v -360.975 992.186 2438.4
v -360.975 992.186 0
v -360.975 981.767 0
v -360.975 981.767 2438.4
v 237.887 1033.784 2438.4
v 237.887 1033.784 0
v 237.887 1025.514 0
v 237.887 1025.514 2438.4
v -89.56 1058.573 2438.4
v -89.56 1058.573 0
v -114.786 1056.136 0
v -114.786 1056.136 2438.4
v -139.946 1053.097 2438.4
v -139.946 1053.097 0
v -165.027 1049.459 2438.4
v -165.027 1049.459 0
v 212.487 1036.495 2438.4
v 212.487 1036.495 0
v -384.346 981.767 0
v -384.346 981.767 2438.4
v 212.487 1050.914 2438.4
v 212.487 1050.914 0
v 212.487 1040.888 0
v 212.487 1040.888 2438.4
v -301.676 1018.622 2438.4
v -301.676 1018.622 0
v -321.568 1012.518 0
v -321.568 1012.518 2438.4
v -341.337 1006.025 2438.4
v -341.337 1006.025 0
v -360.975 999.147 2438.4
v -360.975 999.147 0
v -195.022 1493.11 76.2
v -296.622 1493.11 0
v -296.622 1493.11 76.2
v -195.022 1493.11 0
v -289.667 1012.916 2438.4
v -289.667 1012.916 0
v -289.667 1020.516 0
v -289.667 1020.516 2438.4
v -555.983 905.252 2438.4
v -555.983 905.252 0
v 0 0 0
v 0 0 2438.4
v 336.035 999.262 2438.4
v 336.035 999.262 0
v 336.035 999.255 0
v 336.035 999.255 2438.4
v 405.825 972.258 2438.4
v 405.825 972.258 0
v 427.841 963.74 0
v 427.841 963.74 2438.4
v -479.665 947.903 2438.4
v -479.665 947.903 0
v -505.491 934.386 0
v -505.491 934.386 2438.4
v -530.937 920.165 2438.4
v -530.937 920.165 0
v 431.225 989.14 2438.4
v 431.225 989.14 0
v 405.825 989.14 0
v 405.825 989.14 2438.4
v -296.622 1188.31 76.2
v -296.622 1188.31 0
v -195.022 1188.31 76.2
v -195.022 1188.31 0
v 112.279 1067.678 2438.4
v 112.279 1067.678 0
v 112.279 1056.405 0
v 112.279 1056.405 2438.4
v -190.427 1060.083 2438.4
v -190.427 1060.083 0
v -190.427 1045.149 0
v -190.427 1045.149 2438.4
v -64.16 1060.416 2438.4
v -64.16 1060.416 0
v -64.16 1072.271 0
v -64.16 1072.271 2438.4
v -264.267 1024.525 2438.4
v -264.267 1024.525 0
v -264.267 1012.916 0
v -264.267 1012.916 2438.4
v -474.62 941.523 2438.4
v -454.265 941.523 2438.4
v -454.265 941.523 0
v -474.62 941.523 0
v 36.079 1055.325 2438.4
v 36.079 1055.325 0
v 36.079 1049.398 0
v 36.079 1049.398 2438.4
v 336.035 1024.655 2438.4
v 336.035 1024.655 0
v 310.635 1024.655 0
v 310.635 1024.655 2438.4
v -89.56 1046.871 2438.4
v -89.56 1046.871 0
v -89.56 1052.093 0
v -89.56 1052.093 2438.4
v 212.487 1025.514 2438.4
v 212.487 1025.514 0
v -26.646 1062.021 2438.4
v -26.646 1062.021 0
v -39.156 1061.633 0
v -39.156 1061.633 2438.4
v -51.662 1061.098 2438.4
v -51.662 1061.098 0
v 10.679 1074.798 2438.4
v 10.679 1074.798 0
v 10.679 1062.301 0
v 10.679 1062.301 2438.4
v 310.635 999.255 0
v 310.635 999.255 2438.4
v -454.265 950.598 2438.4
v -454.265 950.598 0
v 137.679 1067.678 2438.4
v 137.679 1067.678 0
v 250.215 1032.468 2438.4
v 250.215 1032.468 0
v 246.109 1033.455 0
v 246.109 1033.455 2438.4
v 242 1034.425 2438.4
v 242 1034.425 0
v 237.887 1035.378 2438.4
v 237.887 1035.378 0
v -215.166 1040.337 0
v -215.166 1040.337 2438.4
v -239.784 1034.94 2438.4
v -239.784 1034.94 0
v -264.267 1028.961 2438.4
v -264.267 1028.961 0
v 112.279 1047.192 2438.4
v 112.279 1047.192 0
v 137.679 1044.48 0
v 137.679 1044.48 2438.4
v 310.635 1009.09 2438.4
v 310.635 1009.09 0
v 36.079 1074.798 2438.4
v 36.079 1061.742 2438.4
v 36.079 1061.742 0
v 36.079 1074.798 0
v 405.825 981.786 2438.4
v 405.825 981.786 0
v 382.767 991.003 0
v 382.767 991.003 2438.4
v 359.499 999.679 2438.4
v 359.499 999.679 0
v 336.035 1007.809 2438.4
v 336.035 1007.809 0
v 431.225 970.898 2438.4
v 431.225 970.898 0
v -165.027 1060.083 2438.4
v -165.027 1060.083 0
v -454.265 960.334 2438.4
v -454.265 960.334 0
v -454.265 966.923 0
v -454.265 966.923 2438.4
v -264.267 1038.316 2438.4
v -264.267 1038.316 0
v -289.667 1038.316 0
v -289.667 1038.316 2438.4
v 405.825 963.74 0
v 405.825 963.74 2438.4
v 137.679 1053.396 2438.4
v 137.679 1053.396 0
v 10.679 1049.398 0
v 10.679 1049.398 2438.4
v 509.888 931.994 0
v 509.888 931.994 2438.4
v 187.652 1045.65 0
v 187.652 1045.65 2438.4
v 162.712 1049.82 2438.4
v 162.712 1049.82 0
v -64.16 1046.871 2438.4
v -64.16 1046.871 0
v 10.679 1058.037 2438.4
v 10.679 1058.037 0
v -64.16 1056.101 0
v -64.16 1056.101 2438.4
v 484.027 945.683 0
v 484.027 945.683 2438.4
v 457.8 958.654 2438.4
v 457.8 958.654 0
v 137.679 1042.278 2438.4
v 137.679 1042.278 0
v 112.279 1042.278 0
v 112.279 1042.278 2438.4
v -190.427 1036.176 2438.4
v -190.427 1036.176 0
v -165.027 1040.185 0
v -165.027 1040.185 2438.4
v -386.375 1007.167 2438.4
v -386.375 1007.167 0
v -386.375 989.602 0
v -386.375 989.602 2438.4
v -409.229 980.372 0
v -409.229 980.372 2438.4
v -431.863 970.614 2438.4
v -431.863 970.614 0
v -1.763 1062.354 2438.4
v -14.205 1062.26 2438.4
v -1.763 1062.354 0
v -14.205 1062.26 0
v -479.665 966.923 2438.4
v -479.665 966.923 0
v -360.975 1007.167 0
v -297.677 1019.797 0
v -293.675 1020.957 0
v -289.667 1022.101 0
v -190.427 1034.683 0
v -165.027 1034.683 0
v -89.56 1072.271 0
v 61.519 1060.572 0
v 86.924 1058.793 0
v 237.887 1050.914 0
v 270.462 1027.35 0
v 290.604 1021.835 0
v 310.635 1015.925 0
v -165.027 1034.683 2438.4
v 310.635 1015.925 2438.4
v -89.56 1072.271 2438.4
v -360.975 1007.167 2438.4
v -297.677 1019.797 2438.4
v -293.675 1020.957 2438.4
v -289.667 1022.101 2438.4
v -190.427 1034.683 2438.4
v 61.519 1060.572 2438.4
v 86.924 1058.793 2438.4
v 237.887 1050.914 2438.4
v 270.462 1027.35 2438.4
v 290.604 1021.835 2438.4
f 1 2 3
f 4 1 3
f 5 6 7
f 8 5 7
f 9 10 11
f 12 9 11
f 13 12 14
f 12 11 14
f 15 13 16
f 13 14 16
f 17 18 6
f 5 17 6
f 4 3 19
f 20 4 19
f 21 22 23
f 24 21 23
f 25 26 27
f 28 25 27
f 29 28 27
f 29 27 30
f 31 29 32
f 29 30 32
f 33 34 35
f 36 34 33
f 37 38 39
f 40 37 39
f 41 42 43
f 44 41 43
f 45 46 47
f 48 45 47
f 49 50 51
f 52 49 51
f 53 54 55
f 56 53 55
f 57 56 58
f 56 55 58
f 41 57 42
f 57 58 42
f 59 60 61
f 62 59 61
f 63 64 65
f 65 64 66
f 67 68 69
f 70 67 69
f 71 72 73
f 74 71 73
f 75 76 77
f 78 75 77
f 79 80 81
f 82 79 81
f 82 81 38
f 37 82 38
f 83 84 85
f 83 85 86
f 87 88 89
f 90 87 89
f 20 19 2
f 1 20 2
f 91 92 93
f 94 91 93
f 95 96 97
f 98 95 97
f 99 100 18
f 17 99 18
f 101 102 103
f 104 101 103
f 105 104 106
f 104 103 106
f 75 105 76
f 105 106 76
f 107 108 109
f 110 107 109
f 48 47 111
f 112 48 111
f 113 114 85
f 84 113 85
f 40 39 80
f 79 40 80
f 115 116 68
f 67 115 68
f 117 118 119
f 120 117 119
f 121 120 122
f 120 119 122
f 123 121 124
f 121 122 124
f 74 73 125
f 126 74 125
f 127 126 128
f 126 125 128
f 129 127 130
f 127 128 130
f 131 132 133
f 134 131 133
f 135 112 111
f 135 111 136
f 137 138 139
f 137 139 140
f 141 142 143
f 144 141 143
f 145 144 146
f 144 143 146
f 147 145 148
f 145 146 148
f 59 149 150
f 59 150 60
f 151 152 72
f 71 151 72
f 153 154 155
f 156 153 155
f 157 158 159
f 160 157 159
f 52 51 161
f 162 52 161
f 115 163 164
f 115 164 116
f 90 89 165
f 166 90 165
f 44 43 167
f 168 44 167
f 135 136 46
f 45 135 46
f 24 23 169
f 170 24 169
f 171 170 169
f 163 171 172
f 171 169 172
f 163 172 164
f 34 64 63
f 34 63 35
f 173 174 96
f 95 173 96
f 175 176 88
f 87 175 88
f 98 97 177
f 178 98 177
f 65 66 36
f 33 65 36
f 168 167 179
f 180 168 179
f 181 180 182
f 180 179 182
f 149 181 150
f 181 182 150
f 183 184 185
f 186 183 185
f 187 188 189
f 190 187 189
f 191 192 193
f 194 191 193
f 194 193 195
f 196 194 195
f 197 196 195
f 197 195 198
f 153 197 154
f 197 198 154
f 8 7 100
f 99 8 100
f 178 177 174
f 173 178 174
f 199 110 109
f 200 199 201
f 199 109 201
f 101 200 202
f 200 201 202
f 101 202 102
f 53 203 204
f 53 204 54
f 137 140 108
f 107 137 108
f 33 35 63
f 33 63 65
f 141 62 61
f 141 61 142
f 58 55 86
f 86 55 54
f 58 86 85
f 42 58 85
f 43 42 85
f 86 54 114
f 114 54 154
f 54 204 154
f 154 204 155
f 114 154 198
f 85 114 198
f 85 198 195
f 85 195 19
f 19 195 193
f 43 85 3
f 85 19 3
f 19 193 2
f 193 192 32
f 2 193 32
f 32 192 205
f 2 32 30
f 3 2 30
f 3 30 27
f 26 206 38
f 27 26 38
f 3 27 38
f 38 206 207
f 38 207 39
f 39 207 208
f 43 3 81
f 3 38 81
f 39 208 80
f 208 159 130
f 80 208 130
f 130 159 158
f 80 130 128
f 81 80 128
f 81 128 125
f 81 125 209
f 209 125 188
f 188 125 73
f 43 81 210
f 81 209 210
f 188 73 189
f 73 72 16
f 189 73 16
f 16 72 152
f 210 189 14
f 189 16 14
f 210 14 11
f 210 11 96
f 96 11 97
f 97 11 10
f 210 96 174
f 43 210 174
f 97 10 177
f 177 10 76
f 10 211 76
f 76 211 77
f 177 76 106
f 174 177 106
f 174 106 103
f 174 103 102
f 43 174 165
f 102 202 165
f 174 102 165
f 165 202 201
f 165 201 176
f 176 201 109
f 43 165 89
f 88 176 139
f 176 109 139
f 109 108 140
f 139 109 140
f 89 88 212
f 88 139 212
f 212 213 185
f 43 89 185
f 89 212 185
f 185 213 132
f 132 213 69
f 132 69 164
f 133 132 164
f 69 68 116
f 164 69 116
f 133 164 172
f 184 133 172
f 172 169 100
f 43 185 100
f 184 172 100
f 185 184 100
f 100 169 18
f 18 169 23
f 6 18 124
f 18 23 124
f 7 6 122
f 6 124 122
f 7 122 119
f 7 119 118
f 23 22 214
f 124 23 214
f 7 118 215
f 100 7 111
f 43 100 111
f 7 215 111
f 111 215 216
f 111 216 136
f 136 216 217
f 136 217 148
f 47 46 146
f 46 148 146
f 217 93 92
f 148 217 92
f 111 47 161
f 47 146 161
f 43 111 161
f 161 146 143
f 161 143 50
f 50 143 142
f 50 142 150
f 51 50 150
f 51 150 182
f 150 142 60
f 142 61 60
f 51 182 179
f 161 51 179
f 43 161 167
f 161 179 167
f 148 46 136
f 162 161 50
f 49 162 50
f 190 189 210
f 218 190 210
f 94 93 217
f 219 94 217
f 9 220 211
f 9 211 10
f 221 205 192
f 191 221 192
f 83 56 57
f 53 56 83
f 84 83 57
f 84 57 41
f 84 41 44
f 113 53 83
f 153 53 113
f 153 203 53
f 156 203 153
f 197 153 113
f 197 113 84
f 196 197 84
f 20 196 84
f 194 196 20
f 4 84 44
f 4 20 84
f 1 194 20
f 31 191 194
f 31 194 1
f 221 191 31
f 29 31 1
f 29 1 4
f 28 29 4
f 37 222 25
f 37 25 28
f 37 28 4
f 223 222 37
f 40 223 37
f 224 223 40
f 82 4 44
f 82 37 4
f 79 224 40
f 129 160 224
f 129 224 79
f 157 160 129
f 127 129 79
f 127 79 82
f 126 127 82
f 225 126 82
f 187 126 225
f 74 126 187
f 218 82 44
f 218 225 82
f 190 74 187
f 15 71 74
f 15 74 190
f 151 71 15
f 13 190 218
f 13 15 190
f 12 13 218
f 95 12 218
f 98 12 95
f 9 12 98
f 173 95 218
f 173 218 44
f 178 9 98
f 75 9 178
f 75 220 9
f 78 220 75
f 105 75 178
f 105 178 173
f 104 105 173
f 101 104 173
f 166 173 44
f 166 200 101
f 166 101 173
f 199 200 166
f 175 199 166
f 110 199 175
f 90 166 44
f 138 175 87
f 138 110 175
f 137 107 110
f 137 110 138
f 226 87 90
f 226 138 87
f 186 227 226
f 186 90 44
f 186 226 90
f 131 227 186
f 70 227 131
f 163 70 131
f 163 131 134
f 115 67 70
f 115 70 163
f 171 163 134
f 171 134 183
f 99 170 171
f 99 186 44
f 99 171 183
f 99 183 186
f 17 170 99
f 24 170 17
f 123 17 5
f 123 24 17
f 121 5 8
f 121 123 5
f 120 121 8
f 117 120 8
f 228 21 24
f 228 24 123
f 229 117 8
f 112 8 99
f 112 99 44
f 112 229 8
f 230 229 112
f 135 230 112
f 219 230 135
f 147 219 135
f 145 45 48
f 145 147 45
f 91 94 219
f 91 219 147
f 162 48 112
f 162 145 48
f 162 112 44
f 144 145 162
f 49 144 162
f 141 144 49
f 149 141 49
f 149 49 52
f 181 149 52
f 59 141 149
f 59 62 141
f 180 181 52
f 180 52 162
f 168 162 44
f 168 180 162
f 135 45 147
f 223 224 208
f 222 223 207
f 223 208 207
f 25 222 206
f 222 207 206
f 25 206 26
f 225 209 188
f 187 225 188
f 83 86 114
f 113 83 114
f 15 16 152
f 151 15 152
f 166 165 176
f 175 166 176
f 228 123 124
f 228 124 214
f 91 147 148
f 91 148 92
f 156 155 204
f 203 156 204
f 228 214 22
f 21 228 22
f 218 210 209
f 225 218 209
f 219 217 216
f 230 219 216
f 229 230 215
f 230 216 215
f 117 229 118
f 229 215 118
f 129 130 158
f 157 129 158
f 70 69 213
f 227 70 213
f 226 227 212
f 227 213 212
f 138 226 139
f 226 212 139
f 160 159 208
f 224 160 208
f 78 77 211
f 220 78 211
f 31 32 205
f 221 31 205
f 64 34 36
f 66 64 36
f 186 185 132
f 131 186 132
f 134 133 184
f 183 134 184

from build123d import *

# Parameters (mm, degrees)
F1_DEPTH = 2438.4
F2_W     = 101.6
F2_H     = 304.8
F3_DEPTH = 76.2


with BuildPart() as f1:
    # F0 (on Top) → F1 (new body)
    with BuildSketch(Plane.XY):
        Polygon((224.1277476209, 924.8243445616), (0, 0), (509.8876894797, 931.9939324599), align=None)
        Polygon((-270.2234111133, 912.4212972272), (-555.9833529721, 905.2517093289), (0, 0), align=None)
        Polygon((-474.6199722337, 941.5233528239), (-555.9833529721, 905.2517093289), (-270.2234111133, 912.4212972272), (-301.6757642422, 1018.6215584278), (-360.974825498, 992.1861474365), (-360.974825498, 981.7673301894), (-384.3459802856, 981.7673301894), (-454.2646013891, 950.5977392098), (-454.2646013891, 941.5233528239), align=None)
        with BuildLine():
            ThreePointArc((-479.6646013891, 947.9029571635), (-518.2629193552, 927.3627620551), (-555.9833529721, 905.2517093289))
            Line((-555.9833529721, 905.2517093289), (-474.6199722337, 941.5233528239))
            Line((-474.6199722337, 941.5233528239), (-479.6646013891, 941.5233528239))
            Line((-479.6646013891, 941.5233528239), (-479.6646013891, 947.9029571635))
        make_face()
        with BuildLine():
            Line((-479.6646013891, 966.9233528239), (-479.6646013891, 947.9029571635))
            ThreePointArc((-479.6646013891, 947.9029571635), (-467.0059668107, 954.2031088758), (-454.2646013891, 960.3342220028))
            Line((-454.2646013891, 960.3342220028), (-454.2646013891, 966.9233528239))
            Line((-454.2646013891, 966.9233528239), (-479.6646013891, 966.9233528239))
        make_face()
        with BuildLine():
            ThreePointArc((-454.2646013891, 960.3342220028), (-467.0059668107, 954.2031088758), (-479.6646013891, 947.9029571635))
            Line((-479.6646013891, 947.9029571635), (-479.6646013891, 941.5233528239))
            Line((-479.6646013891, 941.5233528239), (-474.6199722337, 941.5233528239))
            Line((-474.6199722337, 941.5233528239), (-454.2646013891, 950.5977392098))
            Line((-454.2646013891, 950.5977392098), (-454.2646013891, 960.3342220028))
        make_face()
        Polygon((-270.2234111133, 912.4212972272), (0, 0), (-23.0478317462, 918.6228208944), align=None)
        Polygon((-23.0478317462, 918.6228208944), (0, 0), (224.1277476209, 924.8243445616), align=None)
        Polygon((-301.6757642422, 1018.6215584278), (-270.2234111133, 912.4212972272), (-23.0478317462, 918.6228208944), (-26.6456220174, 1062.020789275), (-64.1601768635, 1056.1010642124), (-64.1601768635, 1046.8709788577), (-89.5601768635, 1046.8709788577), (-89.5601768635, 1052.092992753), (-165.0265067315, 1040.1845501197), (-165.0265067315, 1034.6831365981), (-190.4265067315, 1034.6831365981), (-190.4265067315, 1036.1764786603), (-264.2672867652, 1024.5245446843), (-264.2672867652, 1012.9155556966), (-289.6672867652, 1012.9155556966), (-289.6672867652, 1020.5164732249), align=None)
        with BuildLine():
            ThreePointArc((-386.374825498, 989.6022636627), (-420.5743882774, 975.558983327), (-454.2646013891, 960.3342220028))
            Line((-454.2646013891, 960.3342220028), (-454.2646013891, 950.5977392098))
            Line((-454.2646013891, 950.5977392098), (-384.3459802856, 981.7673301894))
            Line((-384.3459802856, 981.7673301894), (-386.374825498, 981.7673301894))
            Line((-386.374825498, 981.7673301894), (-386.374825498, 989.6022636627))
        make_face()
        with BuildLine():
            Line((427.8412147102, 963.7398903784), (509.8876894797, 931.9939324599))
            ThreePointArc((509.8876894797, 931.9939324599), (470.9582981255, 952.2585927424), (431.2251324627, 970.8980539467))
            Line((431.2251324626, 970.8980539467), (431.2251324626, 963.7398903784))
            Line((431.2251324626, 963.7398903784), (427.8412147102, 963.7398903784))
        make_face()
        Polygon((224.1277476209, 924.8243445616), (509.8876894797, 931.9939324599), (427.8412147102, 963.7398903784), (405.8251324626, 963.7398903784), (405.8251324626, 972.2584967234), (336.0345957465, 999.2623070386), (336.0345957465, 999.2549818141), (310.6345957465, 999.2549818141), (310.6345957465, 1009.090240943), (250.2148473105, 1032.4682446499), align=None)
        Polygon((-26.6456220174, 1062.020789275), (-23.0478317462, 918.6228208944), (224.1277476209, 924.8243445616), (250.2148473105, 1032.4682446499), (237.8867258321, 1033.7841687362), (237.8867258321, 1025.5143731109), (212.4867258321, 1025.5143731109), (212.4867258321, 1036.4954067663), (137.6792180415, 1044.480483934), (137.6792180415, 1042.2778865373), (112.2792180415, 1042.2778865373), (112.2792180415, 1047.1917219641), (36.0792180415, 1055.3254360545), (36.0792180415, 1049.3977159324), (10.6792180415, 1049.3977159324), (10.6792180415, 1058.0366740846), align=None)
        with BuildLine():
            Line((-360.974825498, 992.1861474365), (-301.6757642422, 1018.6215584278))
            ThreePointArc((-301.6757642422, 1018.6215584278), (-331.4683434869, 1009.3200103491), (-360.974825498, 999.1472971398))
            Line((-360.974825498, 999.1472971398), (-360.974825498, 992.1861474365))
        make_face()
        with BuildLine():
            ThreePointArc((-289.6672867653, 1022.1012714027), (-295.6766444857, 1020.3790805042), (-301.6757642422, 1018.6215584278))
            Line((-301.6757642422, 1018.6215584278), (-289.6672867652, 1020.5164732249))
            Line((-289.6672867652, 1020.5164732249), (-289.6672867652, 1022.1012714027))
        make_face()
        with BuildLine():
            Line((-386.374825498, 1007.1673301894), (-386.374825498, 989.6022636627))
            ThreePointArc((-386.374825498, 989.6022636627), (-373.7053011759, 994.4558783063), (-360.974825498, 999.1472971398))
            Line((-360.974825498, 999.1472971398), (-360.974825498, 1007.1673301894))
            Line((-360.974825498, 1007.1673301894), (-386.374825498, 1007.1673301894))
        make_face()
        with BuildLine():
            ThreePointArc((-360.974825498, 999.1472971398), (-373.7053011759, 994.4558783063), (-386.374825498, 989.6022636627))
            Line((-386.374825498, 989.6022636627), (-386.374825498, 981.7673301894))
            Line((-386.374825498, 981.7673301894), (-384.3459802856, 981.7673301894))
            Line((-384.3459802856, 981.7673301894), (-360.974825498, 992.1861474365))
            Line((-360.974825498, 992.1861474365), (-360.974825498, 999.1472971398))
        make_face()
        with BuildLine():
            Line((431.2251324626, 963.7398903784), (431.2251324626, 970.8980539467))
            ThreePointArc((431.2251324627, 970.8980539467), (418.5605384386, 976.4247137834), (405.8251324626, 981.786182367))
            Line((405.8251324626, 981.786182367), (405.8251324626, 972.2584967234))
            Line((405.8251324626, 972.2584967234), (427.8412147102, 963.7398903784))
            Line((427.8412147102, 963.7398903784), (431.2251324626, 963.7398903784))
        make_face()
        with BuildLine():
            ThreePointArc((405.8251324626, 981.786182367), (418.5605384386, 976.4247137834), (431.2251324627, 970.8980539467))
            Line((431.2251324626, 970.8980539467), (431.2251324626, 989.1398903784))
            Line((431.2251324626, 989.1398903784), (405.8251324626, 989.1398903784))
            Line((405.8251324626, 989.1398903784), (405.8251324626, 981.786182367))
        make_face()
        with BuildLine():
            Line((-64.1601768635, 1056.1010642124), (-26.6456220174, 1062.020789275))
            ThreePointArc((-26.6456220174, 1062.020789275), (-45.4099911319, 1061.3840392292), (-64.1601768634, 1060.4157758775))
            Line((-64.1601768635, 1060.4157758775), (-64.1601768635, 1056.1010642124))
        make_face()
        with BuildLine():
            ThreePointArc((10.6792180415, 1062.301322755), (-7.9844341527, 1062.3249949221), (-26.6456220174, 1062.020789275))
            Line((-26.6456220174, 1062.020789275), (10.6792180415, 1058.0366740846))
            Line((10.6792180415, 1058.0366740846), (10.6792180415, 1062.301322755))
        make_face()
        with BuildLine():
            Line((237.8867258321, 1033.7841687362), (250.2148473105, 1032.4682446499))
            ThreePointArc((250.2148473105, 1032.4682446499), (244.0551237128, 1033.9416050312), (237.8867258321, 1035.3782167391))
            Line((237.8867258321, 1035.3782167391), (237.8867258321, 1033.7841687362))
        make_face()
        with BuildLine():
            ThreePointArc((310.6345957465, 1015.9253387678), (280.5466830638, 1024.6422325119), (250.2148473105, 1032.4682446499))
            Line((250.2148473105, 1032.4682446499), (310.6345957465, 1009.090240943))
            Line((310.6345957465, 1009.090240943), (310.6345957465, 1015.9253387678))
        make_face()
        with BuildLine():
            Line((-289.6672867652, 1038.3155556966), (-289.6672867652, 1022.1012714027))
            ThreePointArc((-289.6672867653, 1022.1012714027), (-276.9885236852, 1025.6098204345), (-264.2672867653, 1028.9611009026))
            Line((-264.2672867652, 1028.9611009026), (-264.2672867652, 1038.3155556966))
            Line((-264.2672867652, 1038.3155556966), (-289.6672867652, 1038.3155556966))
        make_face()
        with BuildLine():
            ThreePointArc((-264.2672867653, 1028.9611009026), (-276.9885236852, 1025.6098204345), (-289.6672867653, 1022.1012714027))
            Line((-289.6672867652, 1022.1012714027), (-289.6672867652, 1020.5164732249))
            Line((-289.6672867652, 1020.5164732249), (-264.2672867652, 1024.5245446843))
            Line((-264.2672867652, 1024.5245446843), (-264.2672867652, 1028.9611009026))
        make_face()
        with BuildLine():
            Line((405.8251324626, 972.2584967234), (405.8251324626, 981.786182367))
            ThreePointArc((405.8251324626, 981.786182367), (371.1579991079, 995.4094060854), (336.0345957465, 1007.8089583282))
            Line((336.0345957465, 1007.8089583282), (336.0345957465, 999.2623070386))
            Line((336.0345957465, 999.2623070386), (405.8251324626, 972.2584967234))
        make_face()
        with BuildLine():
            Line((-64.1601768635, 1056.1010642124), (-64.1601768635, 1060.4157758775))
            ThreePointArc((-64.1601768634, 1060.4157758775), (-76.8656984749, 1059.5705783113), (-89.5601768635, 1058.5731532328))
            Line((-89.5601768635, 1058.5731532328), (-89.5601768635, 1052.092992753))
            Line((-89.5601768635, 1052.092992753), (-64.1601768635, 1056.1010642124))
        make_face()
        with BuildLine():
            ThreePointArc((-89.5601768635, 1058.5731532328), (-76.8656984749, 1059.5705783113), (-64.1601768634, 1060.4157758775))
            Line((-64.1601768635, 1060.4157758775), (-64.1601768635, 1072.2709788577))
            Line((-64.1601768635, 1072.2709788577), (-89.5601768635, 1072.2709788577))
            Line((-89.5601768635, 1072.2709788577), (-89.5601768635, 1058.5731532328))
        make_face()
        with BuildLine():
            Line((10.6792180415, 1074.7977159324), (10.6792180415, 1062.301322755))
            ThreePointArc((10.6792180415, 1062.301322755), (23.3808896135, 1062.0976791359), (36.0792180415, 1061.7421702327))
            Line((36.0792180415, 1061.7421702327), (36.0792180415, 1074.7977159324))
            Line((36.0792180415, 1074.7977159324), (10.6792180415, 1074.7977159324))
        make_face()
        with BuildLine():
            ThreePointArc((36.0792180415, 1061.7421702327), (23.3808896135, 1062.0976791359), (10.6792180415, 1062.301322755))
            Line((10.6792180415, 1062.301322755), (10.6792180415, 1058.0366740846))
            Line((10.6792180415, 1058.0366740846), (36.0792180415, 1055.3254360545))
            Line((36.0792180415, 1055.3254360545), (36.0792180415, 1061.7421702327))
        make_face()
        with BuildLine():
            Line((237.8867258321, 1033.7841687362), (237.8867258321, 1035.3782167391))
            ThreePointArc((237.8867258321, 1035.3782167391), (225.2035757566, 1038.2107182511), (212.4867258321, 1040.887860132))
            Line((212.4867258321, 1040.887860132), (212.4867258321, 1036.4954067663))
            Line((212.4867258321, 1036.4954067663), (237.8867258321, 1033.7841687362))
        make_face()
        with BuildLine():
            ThreePointArc((212.4867258321, 1040.887860132), (225.2035757566, 1038.2107182511), (237.8867258321, 1035.3782167391))
            Line((237.8867258321, 1035.3782167391), (237.8867258321, 1050.9143731109))
            Line((237.8867258321, 1050.9143731109), (212.4867258321, 1050.9143731109))
            Line((212.4867258321, 1050.9143731109), (212.4867258321, 1040.887860132))
        make_face()
        with BuildLine():
            Line((310.6345957465, 1024.6549818141), (310.6345957465, 1015.9253387678))
            ThreePointArc((310.6345957465, 1015.9253387678), (323.3600620275, 1011.9468446073), (336.0345957465, 1007.8089583282))
            Line((336.0345957465, 1007.8089583282), (336.0345957465, 1024.6549818141))
            Line((336.0345957465, 1024.6549818141), (310.6345957465, 1024.6549818141))
        make_face()
        with BuildLine():
            ThreePointArc((336.0345957465, 1007.8089583282), (323.3600620275, 1011.9468446073), (310.6345957465, 1015.9253387678))
            Line((310.6345957465, 1015.9253387678), (310.6345957465, 1009.090240943))
            Line((310.6345957465, 1009.090240943), (336.0345957465, 999.2623070386))
            Line((336.0345957465, 999.2623070386), (336.0345957465, 1007.8089583282))
        make_face()
        with BuildLine():
            ThreePointArc((-190.4265067315, 1045.1487413565), (-227.4909259443, 1037.7119179416), (-264.2672867653, 1028.9611009026))
            Line((-264.2672867652, 1028.9611009026), (-264.2672867652, 1024.5245446843))
            Line((-264.2672867652, 1024.5245446843), (-190.4265067315, 1036.1764786603))
            Line((-190.4265067315, 1036.1764786603), (-190.4265067315, 1045.1487413565))
        make_face()
        with BuildLine():
            Line((-89.5601768635, 1052.092992753), (-89.5601768635, 1058.5731532328))
            ThreePointArc((-89.5601768635, 1058.5731532328), (-127.3748851511, 1054.691321979), (-165.0265067315, 1049.4590978695))
            Line((-165.0265067315, 1049.4590978695), (-165.0265067315, 1040.1845501197))
            Line((-165.0265067315, 1040.1845501197), (-89.5601768635, 1052.092992753))
        make_face()
        with BuildLine():
            ThreePointArc((112.2792180415, 1056.4049996195), (74.2272034822, 1059.7586839881), (36.0792180415, 1061.7421702327))
            Line((36.0792180415, 1061.7421702327), (36.0792180415, 1055.3254360545))
            Line((36.0792180415, 1055.3254360545), (112.2792180415, 1047.1917219641))
            Line((112.2792180415, 1047.1917219641), (112.2792180415, 1056.4049996195))
        make_face()
        with BuildLine():
            Line((212.4867258321, 1036.4954067663), (212.4867258321, 1040.887860132))
            ThreePointArc((212.4867258321, 1040.887860132), (175.1946312214, 1047.8096140121), (137.6792180416, 1053.3957371019))
            Line((137.6792180415, 1053.3957371019), (137.6792180415, 1044.480483934))
            Line((137.6792180415, 1044.480483934), (212.4867258321, 1036.4954067663))
        make_face()
        with BuildLine():
            Line((-190.4265067315, 1060.0831365981), (-190.4265067315, 1045.1487413565))
            ThreePointArc((-190.4265067315, 1045.1487413565), (-177.739573501, 1047.3809192632), (-165.0265067315, 1049.4590978695))
            Line((-165.0265067315, 1049.4590978695), (-165.0265067315, 1060.0831365981))
            Line((-165.0265067315, 1060.0831365981), (-190.4265067315, 1060.0831365981))
        make_face()
        with BuildLine():
            ThreePointArc((-165.0265067315, 1049.4590978695), (-177.739573501, 1047.3809192632), (-190.4265067315, 1045.1487413565))
            Line((-190.4265067315, 1045.1487413565), (-190.4265067315, 1036.1764786603))
            Line((-190.4265067315, 1036.1764786603), (-165.0265067315, 1040.1845501197))
            Line((-165.0265067315, 1040.1845501197), (-165.0265067315, 1049.4590978695))
        make_face()
        with BuildLine():
            Line((112.2792180415, 1067.6778865373), (112.2792180415, 1056.4049996195))
            ThreePointArc((112.2792180415, 1056.4049996195), (124.9882748801, 1054.9768135687), (137.6792180416, 1053.3957371019))
            Line((137.6792180415, 1053.3957371019), (137.6792180415, 1067.6778865373))
            Line((137.6792180415, 1067.6778865373), (112.2792180415, 1067.6778865373))
        make_face()
        with BuildLine():
            ThreePointArc((137.6792180416, 1053.3957371019), (124.9882748801, 1054.9768135687), (112.2792180415, 1056.4049996195))
            Line((112.2792180415, 1056.4049996195), (112.2792180415, 1047.1917219641))
            Line((112.2792180415, 1047.1917219641), (137.6792180415, 1044.480483934))
            Line((137.6792180415, 1044.480483934), (137.6792180415, 1053.3957371019))
        make_face()
    extrude(amount=F1_DEPTH)


with BuildPart() as f3:
    # F2 (on Top) → F3 (new body)
    with BuildSketch(Plane.XY):
        with Locations((-245.8221390843, 1340.7095196815)):
            Rectangle(F2_W, F2_H)
    extrude(amount=F3_DEPTH)


solid = Compound([f1.part, f3.part])
